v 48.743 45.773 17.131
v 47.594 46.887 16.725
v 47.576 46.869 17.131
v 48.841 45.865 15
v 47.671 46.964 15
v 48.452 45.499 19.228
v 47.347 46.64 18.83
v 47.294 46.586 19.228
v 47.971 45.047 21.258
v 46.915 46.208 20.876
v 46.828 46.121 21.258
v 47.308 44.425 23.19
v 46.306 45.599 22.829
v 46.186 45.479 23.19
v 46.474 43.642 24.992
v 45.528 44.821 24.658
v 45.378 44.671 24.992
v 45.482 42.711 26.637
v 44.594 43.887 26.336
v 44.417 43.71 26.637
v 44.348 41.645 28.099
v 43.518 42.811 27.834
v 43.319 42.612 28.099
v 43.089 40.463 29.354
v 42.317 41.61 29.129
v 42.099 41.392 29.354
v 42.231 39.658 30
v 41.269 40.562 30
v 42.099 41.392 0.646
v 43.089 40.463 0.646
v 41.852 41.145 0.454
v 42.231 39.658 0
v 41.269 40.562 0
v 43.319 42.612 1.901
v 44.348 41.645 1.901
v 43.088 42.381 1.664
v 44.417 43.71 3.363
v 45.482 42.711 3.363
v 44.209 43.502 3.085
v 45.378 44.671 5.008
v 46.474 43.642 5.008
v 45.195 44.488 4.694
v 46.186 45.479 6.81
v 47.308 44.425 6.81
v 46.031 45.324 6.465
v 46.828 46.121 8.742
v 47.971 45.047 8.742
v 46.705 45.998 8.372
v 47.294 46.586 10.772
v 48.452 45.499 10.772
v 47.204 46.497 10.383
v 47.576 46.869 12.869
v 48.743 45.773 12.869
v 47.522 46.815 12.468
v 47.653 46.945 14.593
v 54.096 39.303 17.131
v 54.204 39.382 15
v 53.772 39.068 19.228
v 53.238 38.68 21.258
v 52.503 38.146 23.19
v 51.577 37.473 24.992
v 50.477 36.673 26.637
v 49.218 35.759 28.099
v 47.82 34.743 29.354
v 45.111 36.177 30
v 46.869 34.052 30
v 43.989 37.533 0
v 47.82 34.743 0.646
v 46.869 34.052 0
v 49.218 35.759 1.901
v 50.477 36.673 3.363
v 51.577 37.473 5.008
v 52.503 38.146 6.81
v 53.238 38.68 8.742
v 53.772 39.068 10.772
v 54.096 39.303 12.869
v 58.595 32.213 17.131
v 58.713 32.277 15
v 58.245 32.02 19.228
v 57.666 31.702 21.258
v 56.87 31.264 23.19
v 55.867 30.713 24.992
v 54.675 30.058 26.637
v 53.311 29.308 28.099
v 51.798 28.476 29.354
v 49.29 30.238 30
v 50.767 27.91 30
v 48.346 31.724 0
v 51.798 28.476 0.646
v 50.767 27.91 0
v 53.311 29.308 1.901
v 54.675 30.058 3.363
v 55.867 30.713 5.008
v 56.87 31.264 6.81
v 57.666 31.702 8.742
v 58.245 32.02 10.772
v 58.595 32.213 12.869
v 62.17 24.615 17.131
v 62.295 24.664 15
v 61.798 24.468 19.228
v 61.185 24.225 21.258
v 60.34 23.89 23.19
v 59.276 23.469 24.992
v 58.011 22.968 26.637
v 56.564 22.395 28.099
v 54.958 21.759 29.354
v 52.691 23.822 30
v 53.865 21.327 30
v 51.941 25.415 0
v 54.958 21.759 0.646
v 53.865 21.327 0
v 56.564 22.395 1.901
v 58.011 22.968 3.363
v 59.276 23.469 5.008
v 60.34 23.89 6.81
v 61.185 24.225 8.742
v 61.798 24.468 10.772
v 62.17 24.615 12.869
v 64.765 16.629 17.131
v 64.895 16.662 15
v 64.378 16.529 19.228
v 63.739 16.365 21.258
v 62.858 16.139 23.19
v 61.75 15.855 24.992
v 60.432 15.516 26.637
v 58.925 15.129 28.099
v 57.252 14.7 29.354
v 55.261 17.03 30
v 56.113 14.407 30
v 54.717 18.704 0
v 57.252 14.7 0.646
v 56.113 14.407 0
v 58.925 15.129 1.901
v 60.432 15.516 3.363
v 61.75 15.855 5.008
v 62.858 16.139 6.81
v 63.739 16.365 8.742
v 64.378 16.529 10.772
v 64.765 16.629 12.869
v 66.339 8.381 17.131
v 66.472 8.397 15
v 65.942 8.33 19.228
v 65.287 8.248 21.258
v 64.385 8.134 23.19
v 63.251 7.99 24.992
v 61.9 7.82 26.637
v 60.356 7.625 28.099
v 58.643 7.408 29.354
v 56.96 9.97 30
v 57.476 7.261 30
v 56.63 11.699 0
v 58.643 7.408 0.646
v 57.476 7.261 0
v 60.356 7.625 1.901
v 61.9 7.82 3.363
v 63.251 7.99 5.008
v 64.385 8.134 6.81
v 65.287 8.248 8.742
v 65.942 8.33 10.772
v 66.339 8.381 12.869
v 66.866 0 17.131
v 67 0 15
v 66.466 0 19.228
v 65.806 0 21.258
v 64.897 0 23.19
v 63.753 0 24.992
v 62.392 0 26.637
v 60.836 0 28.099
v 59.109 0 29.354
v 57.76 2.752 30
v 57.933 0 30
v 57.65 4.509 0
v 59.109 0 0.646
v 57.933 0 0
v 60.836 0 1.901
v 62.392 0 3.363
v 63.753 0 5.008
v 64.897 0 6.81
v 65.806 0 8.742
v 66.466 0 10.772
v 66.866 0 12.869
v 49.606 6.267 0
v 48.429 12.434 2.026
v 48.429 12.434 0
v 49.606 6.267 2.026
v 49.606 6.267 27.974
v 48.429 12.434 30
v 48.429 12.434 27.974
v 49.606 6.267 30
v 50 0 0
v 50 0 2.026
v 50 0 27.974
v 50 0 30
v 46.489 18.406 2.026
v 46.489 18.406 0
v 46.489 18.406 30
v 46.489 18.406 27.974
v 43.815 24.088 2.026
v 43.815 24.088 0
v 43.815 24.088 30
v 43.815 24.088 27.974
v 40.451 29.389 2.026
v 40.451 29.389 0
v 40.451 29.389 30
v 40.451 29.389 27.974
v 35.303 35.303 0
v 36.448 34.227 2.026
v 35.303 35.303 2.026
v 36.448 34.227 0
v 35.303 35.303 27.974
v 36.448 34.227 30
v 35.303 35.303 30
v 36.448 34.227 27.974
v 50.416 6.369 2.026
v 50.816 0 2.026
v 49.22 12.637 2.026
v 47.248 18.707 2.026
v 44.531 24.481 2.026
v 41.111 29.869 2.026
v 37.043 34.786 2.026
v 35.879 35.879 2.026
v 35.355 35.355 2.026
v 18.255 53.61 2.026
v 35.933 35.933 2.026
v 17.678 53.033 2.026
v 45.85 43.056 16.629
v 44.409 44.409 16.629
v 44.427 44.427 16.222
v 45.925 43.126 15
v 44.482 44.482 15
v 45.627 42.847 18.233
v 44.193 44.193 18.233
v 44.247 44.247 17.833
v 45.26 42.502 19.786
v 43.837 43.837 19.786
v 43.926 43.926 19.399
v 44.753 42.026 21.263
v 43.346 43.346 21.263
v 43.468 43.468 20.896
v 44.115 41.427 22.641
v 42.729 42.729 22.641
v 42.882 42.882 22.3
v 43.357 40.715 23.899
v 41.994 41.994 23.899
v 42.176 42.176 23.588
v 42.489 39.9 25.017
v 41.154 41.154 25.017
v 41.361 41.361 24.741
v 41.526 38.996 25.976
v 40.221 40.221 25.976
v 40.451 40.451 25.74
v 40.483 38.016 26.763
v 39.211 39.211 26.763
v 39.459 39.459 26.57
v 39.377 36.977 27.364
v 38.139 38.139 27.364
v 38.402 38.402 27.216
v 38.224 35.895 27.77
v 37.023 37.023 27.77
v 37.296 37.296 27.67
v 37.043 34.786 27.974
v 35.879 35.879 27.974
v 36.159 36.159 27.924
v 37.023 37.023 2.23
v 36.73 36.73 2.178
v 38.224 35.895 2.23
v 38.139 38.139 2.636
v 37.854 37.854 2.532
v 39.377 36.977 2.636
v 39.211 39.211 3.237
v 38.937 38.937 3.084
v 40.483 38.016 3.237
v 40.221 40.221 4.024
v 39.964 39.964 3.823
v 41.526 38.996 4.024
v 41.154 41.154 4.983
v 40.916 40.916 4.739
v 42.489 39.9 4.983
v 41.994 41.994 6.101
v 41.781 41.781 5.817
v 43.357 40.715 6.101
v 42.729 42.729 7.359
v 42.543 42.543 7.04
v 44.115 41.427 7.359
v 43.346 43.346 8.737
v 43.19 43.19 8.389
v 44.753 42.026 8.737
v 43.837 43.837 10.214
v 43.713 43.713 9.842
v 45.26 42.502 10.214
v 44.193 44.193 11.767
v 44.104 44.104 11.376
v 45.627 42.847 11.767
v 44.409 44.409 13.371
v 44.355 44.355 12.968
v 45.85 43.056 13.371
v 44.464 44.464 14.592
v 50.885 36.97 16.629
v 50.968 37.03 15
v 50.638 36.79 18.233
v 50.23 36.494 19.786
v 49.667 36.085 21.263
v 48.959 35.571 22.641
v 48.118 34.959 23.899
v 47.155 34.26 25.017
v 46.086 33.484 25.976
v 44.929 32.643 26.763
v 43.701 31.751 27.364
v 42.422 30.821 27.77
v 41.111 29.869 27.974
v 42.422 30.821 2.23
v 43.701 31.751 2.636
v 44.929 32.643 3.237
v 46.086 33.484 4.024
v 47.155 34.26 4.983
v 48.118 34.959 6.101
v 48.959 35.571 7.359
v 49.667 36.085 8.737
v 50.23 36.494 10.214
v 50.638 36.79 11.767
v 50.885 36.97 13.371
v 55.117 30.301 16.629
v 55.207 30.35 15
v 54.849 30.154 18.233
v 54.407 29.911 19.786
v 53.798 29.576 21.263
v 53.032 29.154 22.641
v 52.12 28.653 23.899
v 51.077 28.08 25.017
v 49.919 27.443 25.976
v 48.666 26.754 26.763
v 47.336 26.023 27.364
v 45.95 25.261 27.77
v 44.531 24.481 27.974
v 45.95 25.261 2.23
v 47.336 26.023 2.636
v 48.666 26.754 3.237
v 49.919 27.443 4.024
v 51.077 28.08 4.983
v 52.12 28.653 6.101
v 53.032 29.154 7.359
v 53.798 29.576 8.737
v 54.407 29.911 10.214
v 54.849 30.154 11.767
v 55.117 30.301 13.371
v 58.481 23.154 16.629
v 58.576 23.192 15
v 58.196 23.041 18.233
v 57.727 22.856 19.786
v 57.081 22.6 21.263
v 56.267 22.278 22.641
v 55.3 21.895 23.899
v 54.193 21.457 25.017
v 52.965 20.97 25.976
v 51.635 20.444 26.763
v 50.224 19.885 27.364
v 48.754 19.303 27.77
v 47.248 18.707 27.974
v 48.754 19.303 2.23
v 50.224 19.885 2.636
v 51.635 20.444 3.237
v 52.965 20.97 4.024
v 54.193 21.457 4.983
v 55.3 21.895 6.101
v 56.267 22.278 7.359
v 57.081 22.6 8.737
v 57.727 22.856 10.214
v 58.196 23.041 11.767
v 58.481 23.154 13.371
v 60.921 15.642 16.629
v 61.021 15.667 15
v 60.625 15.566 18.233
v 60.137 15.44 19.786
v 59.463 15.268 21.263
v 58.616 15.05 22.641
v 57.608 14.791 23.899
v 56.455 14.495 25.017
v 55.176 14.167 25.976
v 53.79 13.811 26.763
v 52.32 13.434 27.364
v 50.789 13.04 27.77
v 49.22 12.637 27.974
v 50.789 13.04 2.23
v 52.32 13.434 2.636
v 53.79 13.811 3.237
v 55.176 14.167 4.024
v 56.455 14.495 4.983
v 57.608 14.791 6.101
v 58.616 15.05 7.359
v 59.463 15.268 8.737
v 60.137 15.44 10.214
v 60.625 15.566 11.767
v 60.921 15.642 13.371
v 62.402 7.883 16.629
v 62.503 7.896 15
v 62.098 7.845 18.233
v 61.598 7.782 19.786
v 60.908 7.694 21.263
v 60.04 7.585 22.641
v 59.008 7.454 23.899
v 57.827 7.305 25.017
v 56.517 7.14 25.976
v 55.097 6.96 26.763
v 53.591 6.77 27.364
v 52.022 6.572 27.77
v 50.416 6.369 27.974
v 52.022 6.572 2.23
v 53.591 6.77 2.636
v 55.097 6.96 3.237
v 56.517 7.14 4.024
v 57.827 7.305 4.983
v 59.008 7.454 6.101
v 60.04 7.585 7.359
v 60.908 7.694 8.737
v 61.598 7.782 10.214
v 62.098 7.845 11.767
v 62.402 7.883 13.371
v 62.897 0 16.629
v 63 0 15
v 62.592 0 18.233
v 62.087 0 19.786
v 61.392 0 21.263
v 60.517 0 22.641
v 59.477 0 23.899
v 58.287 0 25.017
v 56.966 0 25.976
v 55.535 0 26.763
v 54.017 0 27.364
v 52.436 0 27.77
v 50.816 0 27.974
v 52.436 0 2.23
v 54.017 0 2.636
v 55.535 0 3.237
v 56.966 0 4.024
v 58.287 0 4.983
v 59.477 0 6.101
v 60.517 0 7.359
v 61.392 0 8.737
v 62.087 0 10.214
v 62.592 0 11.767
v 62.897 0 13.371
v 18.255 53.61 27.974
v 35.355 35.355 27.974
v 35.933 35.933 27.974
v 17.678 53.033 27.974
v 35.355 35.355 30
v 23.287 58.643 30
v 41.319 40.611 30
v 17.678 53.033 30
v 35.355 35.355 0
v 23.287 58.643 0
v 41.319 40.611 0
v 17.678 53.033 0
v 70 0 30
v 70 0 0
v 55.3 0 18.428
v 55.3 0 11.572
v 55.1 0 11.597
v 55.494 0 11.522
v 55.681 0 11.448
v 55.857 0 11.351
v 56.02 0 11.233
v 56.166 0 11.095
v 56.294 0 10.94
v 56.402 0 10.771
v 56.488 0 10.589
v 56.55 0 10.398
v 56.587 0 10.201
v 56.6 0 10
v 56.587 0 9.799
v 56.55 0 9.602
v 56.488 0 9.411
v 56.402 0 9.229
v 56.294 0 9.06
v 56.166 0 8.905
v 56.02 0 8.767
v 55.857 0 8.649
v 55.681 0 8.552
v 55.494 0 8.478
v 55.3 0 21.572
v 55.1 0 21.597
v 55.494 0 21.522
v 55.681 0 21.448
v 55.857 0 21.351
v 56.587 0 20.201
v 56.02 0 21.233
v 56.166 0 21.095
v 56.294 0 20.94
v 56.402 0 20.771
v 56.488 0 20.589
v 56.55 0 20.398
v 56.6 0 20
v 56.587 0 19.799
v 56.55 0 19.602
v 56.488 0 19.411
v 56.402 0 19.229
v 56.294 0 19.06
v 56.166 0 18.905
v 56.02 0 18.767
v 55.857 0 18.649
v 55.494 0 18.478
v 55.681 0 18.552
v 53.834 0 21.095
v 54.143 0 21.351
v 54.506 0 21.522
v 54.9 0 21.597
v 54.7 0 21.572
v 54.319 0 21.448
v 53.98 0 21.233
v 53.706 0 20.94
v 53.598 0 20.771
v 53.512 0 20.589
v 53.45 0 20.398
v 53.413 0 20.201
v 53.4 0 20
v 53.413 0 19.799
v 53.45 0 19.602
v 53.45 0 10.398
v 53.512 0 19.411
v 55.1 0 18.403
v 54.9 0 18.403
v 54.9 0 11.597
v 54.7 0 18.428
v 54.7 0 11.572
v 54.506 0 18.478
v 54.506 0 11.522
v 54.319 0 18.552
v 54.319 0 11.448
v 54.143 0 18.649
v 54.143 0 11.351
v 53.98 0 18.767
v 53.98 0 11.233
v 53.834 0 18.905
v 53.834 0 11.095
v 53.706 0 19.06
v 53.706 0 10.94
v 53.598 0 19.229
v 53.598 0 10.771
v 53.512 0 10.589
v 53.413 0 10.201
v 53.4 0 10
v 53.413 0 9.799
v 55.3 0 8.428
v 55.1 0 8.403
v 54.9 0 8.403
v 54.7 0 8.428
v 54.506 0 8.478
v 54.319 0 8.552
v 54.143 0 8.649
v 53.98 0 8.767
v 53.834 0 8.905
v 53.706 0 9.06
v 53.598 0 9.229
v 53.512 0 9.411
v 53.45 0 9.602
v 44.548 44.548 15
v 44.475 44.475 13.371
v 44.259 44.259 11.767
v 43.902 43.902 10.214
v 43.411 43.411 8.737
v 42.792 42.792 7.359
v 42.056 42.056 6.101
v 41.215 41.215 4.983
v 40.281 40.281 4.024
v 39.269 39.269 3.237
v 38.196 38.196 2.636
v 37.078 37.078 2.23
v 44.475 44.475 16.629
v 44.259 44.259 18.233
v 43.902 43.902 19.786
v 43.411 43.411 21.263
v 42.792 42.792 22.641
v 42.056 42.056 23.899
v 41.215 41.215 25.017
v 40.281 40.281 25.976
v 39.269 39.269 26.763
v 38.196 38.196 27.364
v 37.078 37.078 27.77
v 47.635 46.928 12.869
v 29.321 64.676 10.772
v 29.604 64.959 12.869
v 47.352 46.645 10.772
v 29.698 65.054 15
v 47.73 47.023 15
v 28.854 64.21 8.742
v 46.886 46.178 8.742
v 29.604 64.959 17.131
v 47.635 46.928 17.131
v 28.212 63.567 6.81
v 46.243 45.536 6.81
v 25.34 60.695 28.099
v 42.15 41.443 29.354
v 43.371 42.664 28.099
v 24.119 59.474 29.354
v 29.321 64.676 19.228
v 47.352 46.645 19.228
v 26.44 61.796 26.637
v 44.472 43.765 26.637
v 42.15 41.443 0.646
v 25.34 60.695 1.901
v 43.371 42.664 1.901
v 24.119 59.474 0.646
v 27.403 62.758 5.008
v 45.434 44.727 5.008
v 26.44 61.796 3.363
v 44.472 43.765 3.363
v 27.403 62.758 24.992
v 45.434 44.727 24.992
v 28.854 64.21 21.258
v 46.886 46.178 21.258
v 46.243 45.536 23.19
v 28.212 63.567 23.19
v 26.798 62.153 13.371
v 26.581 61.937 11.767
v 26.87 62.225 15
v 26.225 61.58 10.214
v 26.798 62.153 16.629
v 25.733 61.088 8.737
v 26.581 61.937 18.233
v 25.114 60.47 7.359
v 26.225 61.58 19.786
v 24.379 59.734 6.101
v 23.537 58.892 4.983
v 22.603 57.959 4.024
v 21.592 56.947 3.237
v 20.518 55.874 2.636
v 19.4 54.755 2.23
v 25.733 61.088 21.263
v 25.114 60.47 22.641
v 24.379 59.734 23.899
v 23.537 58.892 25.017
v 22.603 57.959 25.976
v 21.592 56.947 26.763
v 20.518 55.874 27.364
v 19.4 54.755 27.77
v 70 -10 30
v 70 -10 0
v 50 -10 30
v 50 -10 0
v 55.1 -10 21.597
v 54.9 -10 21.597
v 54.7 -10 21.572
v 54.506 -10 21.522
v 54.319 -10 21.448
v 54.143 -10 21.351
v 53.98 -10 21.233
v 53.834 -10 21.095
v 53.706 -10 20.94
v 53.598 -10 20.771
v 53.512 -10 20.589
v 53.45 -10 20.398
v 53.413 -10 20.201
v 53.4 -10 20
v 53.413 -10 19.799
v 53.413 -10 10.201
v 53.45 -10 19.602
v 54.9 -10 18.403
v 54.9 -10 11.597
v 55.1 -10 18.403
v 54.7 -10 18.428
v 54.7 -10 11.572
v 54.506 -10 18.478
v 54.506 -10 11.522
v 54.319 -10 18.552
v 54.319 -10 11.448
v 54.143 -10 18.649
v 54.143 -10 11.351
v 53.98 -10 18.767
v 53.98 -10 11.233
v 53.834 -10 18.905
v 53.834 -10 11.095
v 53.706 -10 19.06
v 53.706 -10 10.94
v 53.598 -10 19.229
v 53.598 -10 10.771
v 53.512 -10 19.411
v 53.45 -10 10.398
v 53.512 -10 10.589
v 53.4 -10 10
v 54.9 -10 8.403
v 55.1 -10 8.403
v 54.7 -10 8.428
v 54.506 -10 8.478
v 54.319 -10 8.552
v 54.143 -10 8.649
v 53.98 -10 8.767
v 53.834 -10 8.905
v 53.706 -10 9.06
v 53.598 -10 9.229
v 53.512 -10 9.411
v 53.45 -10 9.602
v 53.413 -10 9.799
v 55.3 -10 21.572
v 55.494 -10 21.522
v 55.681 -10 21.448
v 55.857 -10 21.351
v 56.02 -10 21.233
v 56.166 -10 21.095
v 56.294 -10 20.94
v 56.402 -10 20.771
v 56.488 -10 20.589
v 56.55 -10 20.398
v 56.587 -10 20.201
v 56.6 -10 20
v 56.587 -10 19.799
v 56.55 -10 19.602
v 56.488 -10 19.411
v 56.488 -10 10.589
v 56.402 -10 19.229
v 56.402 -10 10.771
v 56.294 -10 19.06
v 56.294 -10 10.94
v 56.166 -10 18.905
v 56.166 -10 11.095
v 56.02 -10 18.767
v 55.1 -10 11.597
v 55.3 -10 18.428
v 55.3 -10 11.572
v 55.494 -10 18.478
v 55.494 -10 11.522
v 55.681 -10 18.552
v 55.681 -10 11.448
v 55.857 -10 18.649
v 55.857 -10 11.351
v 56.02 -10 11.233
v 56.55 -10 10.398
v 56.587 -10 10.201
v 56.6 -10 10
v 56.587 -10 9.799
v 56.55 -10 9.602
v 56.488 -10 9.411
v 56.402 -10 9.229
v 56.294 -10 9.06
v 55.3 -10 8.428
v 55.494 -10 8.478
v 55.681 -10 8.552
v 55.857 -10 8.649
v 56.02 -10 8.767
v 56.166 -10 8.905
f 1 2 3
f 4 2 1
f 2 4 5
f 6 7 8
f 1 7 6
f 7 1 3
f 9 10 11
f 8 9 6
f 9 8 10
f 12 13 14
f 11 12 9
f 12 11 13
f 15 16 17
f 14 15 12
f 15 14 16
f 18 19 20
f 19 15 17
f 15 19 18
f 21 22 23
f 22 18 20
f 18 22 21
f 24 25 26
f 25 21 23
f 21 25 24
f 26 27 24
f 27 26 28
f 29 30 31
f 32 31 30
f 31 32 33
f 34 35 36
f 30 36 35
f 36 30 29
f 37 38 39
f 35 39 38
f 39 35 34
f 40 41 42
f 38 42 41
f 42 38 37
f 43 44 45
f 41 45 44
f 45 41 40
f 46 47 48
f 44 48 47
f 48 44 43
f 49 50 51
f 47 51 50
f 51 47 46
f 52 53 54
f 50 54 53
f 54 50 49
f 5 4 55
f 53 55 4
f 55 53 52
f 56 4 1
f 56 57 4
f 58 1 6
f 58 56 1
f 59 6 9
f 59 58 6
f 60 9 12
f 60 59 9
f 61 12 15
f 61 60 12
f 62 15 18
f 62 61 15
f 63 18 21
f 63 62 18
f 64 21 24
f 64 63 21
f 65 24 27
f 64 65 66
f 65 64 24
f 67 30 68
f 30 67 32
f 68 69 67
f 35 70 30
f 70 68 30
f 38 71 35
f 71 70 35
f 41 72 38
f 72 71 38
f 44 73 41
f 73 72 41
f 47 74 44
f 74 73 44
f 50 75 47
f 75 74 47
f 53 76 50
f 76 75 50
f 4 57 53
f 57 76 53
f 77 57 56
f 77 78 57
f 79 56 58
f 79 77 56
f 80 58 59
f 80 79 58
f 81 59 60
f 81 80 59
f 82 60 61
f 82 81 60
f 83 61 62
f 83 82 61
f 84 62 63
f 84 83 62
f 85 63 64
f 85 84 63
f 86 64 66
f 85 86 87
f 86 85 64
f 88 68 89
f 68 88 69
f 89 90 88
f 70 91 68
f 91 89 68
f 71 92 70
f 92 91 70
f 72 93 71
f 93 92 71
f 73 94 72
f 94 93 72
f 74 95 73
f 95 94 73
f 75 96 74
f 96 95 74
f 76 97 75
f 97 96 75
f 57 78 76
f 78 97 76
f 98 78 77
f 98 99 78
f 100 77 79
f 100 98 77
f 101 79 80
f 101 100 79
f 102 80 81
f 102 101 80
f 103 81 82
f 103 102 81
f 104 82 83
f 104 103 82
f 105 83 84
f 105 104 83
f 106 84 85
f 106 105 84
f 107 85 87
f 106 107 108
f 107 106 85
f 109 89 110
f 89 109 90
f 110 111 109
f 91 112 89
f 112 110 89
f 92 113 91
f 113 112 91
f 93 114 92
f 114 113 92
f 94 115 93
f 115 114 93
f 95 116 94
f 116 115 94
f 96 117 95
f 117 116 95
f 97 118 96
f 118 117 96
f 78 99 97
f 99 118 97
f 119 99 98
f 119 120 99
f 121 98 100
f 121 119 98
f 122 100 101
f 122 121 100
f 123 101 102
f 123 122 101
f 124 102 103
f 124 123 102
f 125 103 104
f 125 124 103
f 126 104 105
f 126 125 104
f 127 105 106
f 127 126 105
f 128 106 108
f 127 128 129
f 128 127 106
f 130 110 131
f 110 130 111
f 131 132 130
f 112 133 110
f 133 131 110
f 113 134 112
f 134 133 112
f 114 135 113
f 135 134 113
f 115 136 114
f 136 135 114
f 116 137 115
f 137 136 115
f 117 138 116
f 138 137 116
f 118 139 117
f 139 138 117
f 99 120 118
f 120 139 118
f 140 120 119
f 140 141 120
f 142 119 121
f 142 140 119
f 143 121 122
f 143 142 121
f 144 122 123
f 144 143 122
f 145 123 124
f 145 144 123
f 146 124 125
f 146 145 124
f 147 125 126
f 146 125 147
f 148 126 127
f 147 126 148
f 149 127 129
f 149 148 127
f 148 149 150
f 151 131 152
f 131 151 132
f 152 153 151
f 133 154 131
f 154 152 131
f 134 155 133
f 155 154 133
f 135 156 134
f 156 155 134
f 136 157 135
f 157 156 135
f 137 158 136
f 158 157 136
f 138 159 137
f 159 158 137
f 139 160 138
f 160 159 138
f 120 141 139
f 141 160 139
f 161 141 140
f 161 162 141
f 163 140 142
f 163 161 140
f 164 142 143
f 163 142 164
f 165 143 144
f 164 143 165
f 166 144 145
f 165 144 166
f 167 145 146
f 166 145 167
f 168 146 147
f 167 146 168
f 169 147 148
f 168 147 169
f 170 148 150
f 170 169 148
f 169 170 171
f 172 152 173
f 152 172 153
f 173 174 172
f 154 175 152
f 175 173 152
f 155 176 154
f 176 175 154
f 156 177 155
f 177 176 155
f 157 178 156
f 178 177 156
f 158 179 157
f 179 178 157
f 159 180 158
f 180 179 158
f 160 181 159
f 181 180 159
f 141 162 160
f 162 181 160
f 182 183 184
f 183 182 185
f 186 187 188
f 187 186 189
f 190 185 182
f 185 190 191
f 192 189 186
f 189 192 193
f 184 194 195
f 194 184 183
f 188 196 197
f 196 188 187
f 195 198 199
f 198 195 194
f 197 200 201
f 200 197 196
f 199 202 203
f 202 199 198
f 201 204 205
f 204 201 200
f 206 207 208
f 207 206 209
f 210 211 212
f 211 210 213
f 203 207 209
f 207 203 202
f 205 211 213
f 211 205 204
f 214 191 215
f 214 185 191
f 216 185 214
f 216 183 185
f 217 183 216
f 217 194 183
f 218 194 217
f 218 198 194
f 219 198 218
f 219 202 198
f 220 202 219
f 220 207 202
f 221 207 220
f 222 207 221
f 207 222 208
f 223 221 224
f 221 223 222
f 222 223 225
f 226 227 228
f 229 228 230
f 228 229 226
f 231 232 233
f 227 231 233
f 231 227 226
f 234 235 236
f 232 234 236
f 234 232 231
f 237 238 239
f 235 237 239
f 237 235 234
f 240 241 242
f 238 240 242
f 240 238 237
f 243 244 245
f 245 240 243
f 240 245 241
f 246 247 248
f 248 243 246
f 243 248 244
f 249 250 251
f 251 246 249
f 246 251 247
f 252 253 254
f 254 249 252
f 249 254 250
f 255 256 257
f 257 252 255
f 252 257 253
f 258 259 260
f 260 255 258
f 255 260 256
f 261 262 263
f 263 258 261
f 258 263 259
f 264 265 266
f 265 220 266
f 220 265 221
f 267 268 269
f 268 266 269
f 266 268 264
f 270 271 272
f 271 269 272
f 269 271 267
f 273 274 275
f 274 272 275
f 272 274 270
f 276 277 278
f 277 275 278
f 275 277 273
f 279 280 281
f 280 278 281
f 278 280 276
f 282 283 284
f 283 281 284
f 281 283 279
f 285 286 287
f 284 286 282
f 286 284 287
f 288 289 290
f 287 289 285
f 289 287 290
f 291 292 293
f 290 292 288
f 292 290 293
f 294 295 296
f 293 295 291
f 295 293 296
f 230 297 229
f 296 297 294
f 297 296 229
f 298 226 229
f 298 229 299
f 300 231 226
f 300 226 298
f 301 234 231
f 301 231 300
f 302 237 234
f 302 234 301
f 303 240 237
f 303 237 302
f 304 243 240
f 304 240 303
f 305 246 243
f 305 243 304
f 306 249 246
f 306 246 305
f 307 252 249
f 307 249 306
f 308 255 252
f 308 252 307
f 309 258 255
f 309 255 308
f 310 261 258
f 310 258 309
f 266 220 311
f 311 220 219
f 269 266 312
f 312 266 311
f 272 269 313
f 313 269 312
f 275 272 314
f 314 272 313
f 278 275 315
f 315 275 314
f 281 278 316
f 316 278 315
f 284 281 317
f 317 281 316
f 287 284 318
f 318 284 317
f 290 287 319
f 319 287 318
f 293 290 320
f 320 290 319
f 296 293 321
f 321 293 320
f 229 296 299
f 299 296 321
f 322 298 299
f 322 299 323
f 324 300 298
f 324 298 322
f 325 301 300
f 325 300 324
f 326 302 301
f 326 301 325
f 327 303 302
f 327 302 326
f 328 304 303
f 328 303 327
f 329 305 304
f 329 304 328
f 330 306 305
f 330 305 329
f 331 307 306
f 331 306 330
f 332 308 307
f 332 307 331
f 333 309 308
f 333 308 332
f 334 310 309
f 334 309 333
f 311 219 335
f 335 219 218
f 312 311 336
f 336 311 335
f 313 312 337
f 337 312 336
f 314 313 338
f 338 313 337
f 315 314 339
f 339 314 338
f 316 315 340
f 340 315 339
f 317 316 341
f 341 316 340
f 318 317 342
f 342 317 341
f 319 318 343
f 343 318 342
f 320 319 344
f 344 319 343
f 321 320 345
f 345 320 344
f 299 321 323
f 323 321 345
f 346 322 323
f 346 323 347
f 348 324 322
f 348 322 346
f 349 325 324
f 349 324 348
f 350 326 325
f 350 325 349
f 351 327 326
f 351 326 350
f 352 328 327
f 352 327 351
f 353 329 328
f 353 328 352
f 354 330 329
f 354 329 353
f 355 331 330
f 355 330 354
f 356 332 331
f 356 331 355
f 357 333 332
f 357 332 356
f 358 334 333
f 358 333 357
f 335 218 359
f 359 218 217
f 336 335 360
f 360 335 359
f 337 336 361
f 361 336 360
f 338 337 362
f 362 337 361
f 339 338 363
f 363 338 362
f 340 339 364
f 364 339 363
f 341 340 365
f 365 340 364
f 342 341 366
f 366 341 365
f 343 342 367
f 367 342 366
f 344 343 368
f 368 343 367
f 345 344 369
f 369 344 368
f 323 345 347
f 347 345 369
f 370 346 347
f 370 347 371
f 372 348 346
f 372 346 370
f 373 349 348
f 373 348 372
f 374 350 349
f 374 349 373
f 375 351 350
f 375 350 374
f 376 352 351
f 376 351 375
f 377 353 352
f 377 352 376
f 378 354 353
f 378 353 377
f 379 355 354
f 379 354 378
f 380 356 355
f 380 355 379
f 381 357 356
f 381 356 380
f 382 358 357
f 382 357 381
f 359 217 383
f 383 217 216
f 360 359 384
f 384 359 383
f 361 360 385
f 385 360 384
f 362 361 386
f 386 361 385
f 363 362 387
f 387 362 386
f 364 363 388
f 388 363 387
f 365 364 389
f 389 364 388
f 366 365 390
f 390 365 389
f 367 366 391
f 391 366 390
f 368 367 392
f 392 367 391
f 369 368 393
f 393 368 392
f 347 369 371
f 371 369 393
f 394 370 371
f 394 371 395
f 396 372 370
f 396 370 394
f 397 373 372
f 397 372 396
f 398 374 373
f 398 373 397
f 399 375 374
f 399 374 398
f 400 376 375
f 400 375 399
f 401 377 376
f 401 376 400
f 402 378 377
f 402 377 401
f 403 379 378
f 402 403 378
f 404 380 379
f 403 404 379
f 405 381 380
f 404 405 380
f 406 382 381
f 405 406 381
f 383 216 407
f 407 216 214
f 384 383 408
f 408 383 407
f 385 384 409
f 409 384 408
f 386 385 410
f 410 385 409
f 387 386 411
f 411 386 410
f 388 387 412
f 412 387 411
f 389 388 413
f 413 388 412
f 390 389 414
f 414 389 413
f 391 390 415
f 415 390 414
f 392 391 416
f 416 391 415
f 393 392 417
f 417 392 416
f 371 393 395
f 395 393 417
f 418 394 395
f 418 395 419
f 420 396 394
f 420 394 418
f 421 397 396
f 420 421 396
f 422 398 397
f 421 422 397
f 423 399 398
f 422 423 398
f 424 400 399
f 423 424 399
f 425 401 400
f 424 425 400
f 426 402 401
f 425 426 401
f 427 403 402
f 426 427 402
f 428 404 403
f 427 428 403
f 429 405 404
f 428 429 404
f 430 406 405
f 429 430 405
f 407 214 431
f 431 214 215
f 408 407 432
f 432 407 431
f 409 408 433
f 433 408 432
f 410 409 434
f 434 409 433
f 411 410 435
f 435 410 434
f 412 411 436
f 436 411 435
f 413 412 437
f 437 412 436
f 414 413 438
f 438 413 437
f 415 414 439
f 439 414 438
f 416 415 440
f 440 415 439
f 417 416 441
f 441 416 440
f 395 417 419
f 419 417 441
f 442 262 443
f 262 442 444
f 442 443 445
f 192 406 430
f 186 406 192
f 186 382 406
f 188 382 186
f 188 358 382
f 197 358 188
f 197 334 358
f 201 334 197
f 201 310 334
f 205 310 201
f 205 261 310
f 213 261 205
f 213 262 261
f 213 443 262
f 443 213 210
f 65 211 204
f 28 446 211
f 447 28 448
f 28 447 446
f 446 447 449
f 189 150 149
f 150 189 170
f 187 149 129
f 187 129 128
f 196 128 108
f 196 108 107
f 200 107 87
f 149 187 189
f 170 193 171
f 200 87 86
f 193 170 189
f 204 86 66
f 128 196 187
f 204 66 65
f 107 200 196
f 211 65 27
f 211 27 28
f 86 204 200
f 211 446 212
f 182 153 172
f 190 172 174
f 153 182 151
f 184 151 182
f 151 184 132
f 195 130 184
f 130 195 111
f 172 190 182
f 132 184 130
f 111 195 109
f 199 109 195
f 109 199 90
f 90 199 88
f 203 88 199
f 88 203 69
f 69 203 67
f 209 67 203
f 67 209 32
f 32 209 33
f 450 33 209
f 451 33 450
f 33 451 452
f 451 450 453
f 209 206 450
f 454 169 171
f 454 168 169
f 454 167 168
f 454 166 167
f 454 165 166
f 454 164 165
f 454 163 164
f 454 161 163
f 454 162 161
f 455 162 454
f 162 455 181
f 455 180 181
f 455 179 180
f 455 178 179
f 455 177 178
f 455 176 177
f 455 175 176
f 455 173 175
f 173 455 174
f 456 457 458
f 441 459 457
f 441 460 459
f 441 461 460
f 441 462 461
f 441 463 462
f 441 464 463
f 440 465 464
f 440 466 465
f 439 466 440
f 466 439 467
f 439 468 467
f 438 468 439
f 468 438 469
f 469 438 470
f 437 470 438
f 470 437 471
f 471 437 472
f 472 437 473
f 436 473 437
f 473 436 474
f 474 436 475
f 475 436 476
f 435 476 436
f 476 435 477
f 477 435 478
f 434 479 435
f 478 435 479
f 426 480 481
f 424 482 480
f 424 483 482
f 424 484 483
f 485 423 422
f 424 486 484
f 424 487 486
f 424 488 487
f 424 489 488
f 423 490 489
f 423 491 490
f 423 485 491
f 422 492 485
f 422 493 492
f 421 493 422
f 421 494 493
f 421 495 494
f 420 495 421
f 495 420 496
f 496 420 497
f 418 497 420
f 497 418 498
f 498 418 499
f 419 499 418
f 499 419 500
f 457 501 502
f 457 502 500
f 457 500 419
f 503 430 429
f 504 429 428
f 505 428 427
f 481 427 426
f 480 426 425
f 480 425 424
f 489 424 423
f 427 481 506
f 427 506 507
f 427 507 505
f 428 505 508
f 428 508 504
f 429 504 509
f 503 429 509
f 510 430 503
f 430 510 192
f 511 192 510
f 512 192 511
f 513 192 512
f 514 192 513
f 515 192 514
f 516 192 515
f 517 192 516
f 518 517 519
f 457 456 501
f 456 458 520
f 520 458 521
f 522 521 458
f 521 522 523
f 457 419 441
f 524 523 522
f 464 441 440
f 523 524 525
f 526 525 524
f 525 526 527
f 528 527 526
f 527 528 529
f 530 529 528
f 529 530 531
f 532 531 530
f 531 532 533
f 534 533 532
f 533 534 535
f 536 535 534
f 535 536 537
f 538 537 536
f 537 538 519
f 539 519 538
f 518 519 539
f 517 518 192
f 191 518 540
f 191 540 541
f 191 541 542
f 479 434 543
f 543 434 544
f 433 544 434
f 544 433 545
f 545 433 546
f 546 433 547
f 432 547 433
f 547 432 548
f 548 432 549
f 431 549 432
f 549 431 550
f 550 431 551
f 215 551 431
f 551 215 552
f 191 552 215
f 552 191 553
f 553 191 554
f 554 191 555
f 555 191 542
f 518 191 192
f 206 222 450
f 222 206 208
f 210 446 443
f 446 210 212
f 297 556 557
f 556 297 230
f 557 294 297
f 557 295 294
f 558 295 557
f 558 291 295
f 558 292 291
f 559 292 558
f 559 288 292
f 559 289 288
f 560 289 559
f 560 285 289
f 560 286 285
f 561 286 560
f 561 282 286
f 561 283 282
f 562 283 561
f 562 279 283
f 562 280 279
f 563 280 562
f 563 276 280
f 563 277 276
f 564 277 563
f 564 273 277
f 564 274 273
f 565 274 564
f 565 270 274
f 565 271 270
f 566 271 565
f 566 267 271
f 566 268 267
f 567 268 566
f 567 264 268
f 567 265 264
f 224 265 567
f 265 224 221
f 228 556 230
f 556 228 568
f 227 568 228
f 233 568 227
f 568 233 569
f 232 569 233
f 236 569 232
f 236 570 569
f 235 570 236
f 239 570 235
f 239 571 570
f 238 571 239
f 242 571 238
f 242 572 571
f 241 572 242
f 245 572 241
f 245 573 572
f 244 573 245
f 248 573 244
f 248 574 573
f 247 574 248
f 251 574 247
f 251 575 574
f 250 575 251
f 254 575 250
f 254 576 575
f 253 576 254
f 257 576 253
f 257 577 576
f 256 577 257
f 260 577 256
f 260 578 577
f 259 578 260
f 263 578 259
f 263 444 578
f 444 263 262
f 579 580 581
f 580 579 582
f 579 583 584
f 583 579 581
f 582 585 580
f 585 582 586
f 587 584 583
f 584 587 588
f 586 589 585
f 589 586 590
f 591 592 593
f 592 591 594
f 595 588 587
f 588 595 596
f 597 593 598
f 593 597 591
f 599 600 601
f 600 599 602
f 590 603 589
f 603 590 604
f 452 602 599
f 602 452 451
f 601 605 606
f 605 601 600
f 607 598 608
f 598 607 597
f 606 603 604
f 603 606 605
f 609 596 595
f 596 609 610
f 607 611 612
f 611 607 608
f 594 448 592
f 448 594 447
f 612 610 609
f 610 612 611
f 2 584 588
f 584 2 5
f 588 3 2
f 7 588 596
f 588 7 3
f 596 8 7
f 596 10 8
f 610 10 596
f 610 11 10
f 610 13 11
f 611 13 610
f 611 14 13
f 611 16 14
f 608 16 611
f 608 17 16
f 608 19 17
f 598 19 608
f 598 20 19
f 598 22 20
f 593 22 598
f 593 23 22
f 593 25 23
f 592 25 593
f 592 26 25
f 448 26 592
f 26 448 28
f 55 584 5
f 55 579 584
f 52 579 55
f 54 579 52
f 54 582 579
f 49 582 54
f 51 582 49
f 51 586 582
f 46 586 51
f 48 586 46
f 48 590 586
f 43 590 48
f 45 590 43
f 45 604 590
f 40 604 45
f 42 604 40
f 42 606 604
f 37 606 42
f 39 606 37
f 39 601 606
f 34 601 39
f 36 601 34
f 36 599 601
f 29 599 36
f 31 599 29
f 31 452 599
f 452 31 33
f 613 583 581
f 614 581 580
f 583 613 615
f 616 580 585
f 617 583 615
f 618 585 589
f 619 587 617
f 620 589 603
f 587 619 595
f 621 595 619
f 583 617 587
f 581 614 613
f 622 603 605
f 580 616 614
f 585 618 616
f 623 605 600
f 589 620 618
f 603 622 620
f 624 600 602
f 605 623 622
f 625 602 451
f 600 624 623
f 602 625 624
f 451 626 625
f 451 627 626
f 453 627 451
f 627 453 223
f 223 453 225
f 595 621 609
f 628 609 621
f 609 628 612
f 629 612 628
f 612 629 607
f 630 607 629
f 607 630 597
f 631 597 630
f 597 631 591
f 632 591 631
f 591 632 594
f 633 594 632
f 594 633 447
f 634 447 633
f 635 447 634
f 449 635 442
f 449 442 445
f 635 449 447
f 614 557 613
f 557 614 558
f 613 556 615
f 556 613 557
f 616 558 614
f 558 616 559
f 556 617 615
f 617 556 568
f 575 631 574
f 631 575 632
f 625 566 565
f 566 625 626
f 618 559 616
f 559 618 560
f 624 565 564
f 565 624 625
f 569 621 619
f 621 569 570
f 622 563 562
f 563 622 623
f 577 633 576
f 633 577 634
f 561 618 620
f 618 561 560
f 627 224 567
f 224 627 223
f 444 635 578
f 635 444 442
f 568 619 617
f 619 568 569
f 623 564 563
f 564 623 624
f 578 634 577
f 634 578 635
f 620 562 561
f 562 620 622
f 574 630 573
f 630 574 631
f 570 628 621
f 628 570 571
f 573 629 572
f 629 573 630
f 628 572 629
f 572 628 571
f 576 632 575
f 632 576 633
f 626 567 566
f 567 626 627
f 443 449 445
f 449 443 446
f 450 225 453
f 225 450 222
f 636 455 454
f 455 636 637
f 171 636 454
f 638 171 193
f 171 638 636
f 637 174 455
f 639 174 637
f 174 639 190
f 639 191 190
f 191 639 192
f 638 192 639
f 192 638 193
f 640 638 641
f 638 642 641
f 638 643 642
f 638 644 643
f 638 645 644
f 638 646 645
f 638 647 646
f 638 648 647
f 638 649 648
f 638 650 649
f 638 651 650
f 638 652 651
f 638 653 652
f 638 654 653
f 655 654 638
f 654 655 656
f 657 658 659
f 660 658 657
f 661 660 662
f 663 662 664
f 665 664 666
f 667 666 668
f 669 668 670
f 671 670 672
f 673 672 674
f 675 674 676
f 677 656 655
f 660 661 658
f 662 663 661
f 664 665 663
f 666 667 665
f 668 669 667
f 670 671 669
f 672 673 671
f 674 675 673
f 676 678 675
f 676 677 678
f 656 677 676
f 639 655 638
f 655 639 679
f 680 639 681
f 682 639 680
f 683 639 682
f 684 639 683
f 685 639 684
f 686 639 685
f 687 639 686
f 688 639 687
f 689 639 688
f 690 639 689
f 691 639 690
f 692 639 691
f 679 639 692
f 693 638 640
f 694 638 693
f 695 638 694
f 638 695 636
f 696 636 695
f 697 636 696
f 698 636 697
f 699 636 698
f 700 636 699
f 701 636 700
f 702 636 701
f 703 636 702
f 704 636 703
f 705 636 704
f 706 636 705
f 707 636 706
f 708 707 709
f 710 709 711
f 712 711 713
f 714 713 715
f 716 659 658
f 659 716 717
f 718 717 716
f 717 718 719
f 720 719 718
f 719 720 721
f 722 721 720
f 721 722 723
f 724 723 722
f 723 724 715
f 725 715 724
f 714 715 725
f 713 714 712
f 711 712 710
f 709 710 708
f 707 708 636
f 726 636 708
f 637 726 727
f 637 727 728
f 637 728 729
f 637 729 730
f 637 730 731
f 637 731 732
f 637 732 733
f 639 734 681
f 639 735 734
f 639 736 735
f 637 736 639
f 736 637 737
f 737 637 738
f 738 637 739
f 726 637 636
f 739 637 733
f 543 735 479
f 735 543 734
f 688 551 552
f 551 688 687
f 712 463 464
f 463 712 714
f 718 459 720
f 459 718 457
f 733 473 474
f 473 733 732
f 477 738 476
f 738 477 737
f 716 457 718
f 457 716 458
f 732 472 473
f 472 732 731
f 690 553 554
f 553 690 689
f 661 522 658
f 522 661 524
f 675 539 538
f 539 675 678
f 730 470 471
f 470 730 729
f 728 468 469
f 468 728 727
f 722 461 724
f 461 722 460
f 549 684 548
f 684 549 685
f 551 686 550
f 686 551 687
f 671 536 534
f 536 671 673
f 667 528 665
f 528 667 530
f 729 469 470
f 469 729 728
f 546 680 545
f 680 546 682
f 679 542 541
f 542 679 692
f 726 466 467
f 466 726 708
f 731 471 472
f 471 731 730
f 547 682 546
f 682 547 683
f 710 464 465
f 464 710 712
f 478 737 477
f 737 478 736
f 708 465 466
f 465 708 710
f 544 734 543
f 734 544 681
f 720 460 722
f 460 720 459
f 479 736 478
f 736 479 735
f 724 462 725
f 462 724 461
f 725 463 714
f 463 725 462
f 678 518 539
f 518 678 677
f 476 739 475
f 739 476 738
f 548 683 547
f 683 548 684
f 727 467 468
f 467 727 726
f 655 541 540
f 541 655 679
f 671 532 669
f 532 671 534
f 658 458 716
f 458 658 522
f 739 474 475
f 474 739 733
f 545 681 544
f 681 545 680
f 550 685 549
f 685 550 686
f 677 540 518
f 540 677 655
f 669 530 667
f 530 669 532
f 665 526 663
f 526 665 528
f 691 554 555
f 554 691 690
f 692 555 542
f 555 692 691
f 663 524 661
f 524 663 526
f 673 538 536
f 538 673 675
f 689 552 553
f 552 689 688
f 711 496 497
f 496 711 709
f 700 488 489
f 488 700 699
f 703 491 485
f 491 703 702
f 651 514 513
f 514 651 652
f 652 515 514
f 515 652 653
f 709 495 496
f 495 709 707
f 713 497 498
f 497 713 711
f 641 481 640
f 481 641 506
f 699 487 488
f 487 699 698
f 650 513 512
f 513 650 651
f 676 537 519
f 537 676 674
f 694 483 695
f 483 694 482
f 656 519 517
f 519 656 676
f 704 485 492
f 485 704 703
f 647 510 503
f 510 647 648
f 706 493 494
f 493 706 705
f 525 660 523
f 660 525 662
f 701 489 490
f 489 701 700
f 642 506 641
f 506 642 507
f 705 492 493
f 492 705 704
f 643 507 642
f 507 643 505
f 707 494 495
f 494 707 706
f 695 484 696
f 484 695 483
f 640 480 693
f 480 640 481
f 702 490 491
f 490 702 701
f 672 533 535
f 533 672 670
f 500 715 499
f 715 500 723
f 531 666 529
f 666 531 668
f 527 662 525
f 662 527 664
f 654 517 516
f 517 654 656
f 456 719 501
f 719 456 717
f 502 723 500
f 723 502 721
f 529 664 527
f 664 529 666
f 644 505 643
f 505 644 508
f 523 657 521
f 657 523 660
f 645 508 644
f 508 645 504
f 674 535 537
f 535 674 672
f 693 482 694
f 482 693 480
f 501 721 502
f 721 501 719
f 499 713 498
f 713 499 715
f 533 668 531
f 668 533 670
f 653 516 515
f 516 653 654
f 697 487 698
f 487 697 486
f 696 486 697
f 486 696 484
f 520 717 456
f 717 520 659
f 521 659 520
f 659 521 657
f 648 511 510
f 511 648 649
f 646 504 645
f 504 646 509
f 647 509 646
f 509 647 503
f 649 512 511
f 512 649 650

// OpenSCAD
$fn=50;

PROJECTILE_D = 25;
EXTRA_MARGIN = 1;

STRAIGHT_SECTION_LENGTH = 25;
inner_scoop_d = PROJECTILE_D + EXTRA_MARGIN;
outer_scoop_d = inner_scoop_d + 8;
overall_height = outer_scoop_d - 4;
SCOOP_EXTRUDE_R = 50;

union(){
    //scoop
    translate([0,0,overall_height/2])
    difference(){
        //body torus
        rotate_extrude(convexity=10){
            translate([SCOOP_EXTRUDE_R,0,0])circle(d=outer_scoop_d);
        }
        //inner (cutting) cylinder
        cylinder(r=SCOOP_EXTRUDE_R,h=100,center=true);
        //inner (cutting) torus
        rotate_extrude(convexity=10){
            translate([SCOOP_EXTRUDE_R,0,0])circle(d=inner_scoop_d);
        }
        
        //top and bottom surface cuts (to make it printable)
        translate([-100,-100,overall_height/2])cube([200,200,200]);
        translate([-100,-100,-200 - overall_height/2])cube([200,200,200]);
        
        //pie slicing cuts
        translate([-200,-100,-100])cube([200,200,200]);
        translate([0,-200,-100])cube([200,200,200]);
        rotate(45)translate([0,0,-100])cube([200,200,200]);
    }
    
    //straight end-section
    difference(){
        rotate(45)
        translate([SCOOP_EXTRUDE_R,0,overall_height/2])
        rotate(90,[-1,0,0])
        difference(){
            translate([0,0,-0.5])
            cylinder(d=outer_scoop_d,h=STRAIGHT_SECTION_LENGTH+0.5);
            translate([0,0,-2])
            cylinder(d=inner_scoop_d, h=STRAIGHT_SECTION_LENGTH+4);
            translate([-200,-100,-100])cube([200,200,200]);
            
        }
        translate([-100,-100,overall_height])cube([200,200,200]);
        translate([-100,-100,-200])cube([200,200,200]);
    }
    //attaching block
    translate([SCOOP_EXTRUDE_R,-10,0])
    difference(){
        cube([20,10,overall_height]);
        translate([5,-15,overall_height/2 - 5])rotate(90,[-1,0,0])cylinder(h=100,d=3.2);
        translate([5,-15,overall_height/2 + 5])rotate(90,[-1,0,0])cylinder(h=100,d=3.2);
    }
}
